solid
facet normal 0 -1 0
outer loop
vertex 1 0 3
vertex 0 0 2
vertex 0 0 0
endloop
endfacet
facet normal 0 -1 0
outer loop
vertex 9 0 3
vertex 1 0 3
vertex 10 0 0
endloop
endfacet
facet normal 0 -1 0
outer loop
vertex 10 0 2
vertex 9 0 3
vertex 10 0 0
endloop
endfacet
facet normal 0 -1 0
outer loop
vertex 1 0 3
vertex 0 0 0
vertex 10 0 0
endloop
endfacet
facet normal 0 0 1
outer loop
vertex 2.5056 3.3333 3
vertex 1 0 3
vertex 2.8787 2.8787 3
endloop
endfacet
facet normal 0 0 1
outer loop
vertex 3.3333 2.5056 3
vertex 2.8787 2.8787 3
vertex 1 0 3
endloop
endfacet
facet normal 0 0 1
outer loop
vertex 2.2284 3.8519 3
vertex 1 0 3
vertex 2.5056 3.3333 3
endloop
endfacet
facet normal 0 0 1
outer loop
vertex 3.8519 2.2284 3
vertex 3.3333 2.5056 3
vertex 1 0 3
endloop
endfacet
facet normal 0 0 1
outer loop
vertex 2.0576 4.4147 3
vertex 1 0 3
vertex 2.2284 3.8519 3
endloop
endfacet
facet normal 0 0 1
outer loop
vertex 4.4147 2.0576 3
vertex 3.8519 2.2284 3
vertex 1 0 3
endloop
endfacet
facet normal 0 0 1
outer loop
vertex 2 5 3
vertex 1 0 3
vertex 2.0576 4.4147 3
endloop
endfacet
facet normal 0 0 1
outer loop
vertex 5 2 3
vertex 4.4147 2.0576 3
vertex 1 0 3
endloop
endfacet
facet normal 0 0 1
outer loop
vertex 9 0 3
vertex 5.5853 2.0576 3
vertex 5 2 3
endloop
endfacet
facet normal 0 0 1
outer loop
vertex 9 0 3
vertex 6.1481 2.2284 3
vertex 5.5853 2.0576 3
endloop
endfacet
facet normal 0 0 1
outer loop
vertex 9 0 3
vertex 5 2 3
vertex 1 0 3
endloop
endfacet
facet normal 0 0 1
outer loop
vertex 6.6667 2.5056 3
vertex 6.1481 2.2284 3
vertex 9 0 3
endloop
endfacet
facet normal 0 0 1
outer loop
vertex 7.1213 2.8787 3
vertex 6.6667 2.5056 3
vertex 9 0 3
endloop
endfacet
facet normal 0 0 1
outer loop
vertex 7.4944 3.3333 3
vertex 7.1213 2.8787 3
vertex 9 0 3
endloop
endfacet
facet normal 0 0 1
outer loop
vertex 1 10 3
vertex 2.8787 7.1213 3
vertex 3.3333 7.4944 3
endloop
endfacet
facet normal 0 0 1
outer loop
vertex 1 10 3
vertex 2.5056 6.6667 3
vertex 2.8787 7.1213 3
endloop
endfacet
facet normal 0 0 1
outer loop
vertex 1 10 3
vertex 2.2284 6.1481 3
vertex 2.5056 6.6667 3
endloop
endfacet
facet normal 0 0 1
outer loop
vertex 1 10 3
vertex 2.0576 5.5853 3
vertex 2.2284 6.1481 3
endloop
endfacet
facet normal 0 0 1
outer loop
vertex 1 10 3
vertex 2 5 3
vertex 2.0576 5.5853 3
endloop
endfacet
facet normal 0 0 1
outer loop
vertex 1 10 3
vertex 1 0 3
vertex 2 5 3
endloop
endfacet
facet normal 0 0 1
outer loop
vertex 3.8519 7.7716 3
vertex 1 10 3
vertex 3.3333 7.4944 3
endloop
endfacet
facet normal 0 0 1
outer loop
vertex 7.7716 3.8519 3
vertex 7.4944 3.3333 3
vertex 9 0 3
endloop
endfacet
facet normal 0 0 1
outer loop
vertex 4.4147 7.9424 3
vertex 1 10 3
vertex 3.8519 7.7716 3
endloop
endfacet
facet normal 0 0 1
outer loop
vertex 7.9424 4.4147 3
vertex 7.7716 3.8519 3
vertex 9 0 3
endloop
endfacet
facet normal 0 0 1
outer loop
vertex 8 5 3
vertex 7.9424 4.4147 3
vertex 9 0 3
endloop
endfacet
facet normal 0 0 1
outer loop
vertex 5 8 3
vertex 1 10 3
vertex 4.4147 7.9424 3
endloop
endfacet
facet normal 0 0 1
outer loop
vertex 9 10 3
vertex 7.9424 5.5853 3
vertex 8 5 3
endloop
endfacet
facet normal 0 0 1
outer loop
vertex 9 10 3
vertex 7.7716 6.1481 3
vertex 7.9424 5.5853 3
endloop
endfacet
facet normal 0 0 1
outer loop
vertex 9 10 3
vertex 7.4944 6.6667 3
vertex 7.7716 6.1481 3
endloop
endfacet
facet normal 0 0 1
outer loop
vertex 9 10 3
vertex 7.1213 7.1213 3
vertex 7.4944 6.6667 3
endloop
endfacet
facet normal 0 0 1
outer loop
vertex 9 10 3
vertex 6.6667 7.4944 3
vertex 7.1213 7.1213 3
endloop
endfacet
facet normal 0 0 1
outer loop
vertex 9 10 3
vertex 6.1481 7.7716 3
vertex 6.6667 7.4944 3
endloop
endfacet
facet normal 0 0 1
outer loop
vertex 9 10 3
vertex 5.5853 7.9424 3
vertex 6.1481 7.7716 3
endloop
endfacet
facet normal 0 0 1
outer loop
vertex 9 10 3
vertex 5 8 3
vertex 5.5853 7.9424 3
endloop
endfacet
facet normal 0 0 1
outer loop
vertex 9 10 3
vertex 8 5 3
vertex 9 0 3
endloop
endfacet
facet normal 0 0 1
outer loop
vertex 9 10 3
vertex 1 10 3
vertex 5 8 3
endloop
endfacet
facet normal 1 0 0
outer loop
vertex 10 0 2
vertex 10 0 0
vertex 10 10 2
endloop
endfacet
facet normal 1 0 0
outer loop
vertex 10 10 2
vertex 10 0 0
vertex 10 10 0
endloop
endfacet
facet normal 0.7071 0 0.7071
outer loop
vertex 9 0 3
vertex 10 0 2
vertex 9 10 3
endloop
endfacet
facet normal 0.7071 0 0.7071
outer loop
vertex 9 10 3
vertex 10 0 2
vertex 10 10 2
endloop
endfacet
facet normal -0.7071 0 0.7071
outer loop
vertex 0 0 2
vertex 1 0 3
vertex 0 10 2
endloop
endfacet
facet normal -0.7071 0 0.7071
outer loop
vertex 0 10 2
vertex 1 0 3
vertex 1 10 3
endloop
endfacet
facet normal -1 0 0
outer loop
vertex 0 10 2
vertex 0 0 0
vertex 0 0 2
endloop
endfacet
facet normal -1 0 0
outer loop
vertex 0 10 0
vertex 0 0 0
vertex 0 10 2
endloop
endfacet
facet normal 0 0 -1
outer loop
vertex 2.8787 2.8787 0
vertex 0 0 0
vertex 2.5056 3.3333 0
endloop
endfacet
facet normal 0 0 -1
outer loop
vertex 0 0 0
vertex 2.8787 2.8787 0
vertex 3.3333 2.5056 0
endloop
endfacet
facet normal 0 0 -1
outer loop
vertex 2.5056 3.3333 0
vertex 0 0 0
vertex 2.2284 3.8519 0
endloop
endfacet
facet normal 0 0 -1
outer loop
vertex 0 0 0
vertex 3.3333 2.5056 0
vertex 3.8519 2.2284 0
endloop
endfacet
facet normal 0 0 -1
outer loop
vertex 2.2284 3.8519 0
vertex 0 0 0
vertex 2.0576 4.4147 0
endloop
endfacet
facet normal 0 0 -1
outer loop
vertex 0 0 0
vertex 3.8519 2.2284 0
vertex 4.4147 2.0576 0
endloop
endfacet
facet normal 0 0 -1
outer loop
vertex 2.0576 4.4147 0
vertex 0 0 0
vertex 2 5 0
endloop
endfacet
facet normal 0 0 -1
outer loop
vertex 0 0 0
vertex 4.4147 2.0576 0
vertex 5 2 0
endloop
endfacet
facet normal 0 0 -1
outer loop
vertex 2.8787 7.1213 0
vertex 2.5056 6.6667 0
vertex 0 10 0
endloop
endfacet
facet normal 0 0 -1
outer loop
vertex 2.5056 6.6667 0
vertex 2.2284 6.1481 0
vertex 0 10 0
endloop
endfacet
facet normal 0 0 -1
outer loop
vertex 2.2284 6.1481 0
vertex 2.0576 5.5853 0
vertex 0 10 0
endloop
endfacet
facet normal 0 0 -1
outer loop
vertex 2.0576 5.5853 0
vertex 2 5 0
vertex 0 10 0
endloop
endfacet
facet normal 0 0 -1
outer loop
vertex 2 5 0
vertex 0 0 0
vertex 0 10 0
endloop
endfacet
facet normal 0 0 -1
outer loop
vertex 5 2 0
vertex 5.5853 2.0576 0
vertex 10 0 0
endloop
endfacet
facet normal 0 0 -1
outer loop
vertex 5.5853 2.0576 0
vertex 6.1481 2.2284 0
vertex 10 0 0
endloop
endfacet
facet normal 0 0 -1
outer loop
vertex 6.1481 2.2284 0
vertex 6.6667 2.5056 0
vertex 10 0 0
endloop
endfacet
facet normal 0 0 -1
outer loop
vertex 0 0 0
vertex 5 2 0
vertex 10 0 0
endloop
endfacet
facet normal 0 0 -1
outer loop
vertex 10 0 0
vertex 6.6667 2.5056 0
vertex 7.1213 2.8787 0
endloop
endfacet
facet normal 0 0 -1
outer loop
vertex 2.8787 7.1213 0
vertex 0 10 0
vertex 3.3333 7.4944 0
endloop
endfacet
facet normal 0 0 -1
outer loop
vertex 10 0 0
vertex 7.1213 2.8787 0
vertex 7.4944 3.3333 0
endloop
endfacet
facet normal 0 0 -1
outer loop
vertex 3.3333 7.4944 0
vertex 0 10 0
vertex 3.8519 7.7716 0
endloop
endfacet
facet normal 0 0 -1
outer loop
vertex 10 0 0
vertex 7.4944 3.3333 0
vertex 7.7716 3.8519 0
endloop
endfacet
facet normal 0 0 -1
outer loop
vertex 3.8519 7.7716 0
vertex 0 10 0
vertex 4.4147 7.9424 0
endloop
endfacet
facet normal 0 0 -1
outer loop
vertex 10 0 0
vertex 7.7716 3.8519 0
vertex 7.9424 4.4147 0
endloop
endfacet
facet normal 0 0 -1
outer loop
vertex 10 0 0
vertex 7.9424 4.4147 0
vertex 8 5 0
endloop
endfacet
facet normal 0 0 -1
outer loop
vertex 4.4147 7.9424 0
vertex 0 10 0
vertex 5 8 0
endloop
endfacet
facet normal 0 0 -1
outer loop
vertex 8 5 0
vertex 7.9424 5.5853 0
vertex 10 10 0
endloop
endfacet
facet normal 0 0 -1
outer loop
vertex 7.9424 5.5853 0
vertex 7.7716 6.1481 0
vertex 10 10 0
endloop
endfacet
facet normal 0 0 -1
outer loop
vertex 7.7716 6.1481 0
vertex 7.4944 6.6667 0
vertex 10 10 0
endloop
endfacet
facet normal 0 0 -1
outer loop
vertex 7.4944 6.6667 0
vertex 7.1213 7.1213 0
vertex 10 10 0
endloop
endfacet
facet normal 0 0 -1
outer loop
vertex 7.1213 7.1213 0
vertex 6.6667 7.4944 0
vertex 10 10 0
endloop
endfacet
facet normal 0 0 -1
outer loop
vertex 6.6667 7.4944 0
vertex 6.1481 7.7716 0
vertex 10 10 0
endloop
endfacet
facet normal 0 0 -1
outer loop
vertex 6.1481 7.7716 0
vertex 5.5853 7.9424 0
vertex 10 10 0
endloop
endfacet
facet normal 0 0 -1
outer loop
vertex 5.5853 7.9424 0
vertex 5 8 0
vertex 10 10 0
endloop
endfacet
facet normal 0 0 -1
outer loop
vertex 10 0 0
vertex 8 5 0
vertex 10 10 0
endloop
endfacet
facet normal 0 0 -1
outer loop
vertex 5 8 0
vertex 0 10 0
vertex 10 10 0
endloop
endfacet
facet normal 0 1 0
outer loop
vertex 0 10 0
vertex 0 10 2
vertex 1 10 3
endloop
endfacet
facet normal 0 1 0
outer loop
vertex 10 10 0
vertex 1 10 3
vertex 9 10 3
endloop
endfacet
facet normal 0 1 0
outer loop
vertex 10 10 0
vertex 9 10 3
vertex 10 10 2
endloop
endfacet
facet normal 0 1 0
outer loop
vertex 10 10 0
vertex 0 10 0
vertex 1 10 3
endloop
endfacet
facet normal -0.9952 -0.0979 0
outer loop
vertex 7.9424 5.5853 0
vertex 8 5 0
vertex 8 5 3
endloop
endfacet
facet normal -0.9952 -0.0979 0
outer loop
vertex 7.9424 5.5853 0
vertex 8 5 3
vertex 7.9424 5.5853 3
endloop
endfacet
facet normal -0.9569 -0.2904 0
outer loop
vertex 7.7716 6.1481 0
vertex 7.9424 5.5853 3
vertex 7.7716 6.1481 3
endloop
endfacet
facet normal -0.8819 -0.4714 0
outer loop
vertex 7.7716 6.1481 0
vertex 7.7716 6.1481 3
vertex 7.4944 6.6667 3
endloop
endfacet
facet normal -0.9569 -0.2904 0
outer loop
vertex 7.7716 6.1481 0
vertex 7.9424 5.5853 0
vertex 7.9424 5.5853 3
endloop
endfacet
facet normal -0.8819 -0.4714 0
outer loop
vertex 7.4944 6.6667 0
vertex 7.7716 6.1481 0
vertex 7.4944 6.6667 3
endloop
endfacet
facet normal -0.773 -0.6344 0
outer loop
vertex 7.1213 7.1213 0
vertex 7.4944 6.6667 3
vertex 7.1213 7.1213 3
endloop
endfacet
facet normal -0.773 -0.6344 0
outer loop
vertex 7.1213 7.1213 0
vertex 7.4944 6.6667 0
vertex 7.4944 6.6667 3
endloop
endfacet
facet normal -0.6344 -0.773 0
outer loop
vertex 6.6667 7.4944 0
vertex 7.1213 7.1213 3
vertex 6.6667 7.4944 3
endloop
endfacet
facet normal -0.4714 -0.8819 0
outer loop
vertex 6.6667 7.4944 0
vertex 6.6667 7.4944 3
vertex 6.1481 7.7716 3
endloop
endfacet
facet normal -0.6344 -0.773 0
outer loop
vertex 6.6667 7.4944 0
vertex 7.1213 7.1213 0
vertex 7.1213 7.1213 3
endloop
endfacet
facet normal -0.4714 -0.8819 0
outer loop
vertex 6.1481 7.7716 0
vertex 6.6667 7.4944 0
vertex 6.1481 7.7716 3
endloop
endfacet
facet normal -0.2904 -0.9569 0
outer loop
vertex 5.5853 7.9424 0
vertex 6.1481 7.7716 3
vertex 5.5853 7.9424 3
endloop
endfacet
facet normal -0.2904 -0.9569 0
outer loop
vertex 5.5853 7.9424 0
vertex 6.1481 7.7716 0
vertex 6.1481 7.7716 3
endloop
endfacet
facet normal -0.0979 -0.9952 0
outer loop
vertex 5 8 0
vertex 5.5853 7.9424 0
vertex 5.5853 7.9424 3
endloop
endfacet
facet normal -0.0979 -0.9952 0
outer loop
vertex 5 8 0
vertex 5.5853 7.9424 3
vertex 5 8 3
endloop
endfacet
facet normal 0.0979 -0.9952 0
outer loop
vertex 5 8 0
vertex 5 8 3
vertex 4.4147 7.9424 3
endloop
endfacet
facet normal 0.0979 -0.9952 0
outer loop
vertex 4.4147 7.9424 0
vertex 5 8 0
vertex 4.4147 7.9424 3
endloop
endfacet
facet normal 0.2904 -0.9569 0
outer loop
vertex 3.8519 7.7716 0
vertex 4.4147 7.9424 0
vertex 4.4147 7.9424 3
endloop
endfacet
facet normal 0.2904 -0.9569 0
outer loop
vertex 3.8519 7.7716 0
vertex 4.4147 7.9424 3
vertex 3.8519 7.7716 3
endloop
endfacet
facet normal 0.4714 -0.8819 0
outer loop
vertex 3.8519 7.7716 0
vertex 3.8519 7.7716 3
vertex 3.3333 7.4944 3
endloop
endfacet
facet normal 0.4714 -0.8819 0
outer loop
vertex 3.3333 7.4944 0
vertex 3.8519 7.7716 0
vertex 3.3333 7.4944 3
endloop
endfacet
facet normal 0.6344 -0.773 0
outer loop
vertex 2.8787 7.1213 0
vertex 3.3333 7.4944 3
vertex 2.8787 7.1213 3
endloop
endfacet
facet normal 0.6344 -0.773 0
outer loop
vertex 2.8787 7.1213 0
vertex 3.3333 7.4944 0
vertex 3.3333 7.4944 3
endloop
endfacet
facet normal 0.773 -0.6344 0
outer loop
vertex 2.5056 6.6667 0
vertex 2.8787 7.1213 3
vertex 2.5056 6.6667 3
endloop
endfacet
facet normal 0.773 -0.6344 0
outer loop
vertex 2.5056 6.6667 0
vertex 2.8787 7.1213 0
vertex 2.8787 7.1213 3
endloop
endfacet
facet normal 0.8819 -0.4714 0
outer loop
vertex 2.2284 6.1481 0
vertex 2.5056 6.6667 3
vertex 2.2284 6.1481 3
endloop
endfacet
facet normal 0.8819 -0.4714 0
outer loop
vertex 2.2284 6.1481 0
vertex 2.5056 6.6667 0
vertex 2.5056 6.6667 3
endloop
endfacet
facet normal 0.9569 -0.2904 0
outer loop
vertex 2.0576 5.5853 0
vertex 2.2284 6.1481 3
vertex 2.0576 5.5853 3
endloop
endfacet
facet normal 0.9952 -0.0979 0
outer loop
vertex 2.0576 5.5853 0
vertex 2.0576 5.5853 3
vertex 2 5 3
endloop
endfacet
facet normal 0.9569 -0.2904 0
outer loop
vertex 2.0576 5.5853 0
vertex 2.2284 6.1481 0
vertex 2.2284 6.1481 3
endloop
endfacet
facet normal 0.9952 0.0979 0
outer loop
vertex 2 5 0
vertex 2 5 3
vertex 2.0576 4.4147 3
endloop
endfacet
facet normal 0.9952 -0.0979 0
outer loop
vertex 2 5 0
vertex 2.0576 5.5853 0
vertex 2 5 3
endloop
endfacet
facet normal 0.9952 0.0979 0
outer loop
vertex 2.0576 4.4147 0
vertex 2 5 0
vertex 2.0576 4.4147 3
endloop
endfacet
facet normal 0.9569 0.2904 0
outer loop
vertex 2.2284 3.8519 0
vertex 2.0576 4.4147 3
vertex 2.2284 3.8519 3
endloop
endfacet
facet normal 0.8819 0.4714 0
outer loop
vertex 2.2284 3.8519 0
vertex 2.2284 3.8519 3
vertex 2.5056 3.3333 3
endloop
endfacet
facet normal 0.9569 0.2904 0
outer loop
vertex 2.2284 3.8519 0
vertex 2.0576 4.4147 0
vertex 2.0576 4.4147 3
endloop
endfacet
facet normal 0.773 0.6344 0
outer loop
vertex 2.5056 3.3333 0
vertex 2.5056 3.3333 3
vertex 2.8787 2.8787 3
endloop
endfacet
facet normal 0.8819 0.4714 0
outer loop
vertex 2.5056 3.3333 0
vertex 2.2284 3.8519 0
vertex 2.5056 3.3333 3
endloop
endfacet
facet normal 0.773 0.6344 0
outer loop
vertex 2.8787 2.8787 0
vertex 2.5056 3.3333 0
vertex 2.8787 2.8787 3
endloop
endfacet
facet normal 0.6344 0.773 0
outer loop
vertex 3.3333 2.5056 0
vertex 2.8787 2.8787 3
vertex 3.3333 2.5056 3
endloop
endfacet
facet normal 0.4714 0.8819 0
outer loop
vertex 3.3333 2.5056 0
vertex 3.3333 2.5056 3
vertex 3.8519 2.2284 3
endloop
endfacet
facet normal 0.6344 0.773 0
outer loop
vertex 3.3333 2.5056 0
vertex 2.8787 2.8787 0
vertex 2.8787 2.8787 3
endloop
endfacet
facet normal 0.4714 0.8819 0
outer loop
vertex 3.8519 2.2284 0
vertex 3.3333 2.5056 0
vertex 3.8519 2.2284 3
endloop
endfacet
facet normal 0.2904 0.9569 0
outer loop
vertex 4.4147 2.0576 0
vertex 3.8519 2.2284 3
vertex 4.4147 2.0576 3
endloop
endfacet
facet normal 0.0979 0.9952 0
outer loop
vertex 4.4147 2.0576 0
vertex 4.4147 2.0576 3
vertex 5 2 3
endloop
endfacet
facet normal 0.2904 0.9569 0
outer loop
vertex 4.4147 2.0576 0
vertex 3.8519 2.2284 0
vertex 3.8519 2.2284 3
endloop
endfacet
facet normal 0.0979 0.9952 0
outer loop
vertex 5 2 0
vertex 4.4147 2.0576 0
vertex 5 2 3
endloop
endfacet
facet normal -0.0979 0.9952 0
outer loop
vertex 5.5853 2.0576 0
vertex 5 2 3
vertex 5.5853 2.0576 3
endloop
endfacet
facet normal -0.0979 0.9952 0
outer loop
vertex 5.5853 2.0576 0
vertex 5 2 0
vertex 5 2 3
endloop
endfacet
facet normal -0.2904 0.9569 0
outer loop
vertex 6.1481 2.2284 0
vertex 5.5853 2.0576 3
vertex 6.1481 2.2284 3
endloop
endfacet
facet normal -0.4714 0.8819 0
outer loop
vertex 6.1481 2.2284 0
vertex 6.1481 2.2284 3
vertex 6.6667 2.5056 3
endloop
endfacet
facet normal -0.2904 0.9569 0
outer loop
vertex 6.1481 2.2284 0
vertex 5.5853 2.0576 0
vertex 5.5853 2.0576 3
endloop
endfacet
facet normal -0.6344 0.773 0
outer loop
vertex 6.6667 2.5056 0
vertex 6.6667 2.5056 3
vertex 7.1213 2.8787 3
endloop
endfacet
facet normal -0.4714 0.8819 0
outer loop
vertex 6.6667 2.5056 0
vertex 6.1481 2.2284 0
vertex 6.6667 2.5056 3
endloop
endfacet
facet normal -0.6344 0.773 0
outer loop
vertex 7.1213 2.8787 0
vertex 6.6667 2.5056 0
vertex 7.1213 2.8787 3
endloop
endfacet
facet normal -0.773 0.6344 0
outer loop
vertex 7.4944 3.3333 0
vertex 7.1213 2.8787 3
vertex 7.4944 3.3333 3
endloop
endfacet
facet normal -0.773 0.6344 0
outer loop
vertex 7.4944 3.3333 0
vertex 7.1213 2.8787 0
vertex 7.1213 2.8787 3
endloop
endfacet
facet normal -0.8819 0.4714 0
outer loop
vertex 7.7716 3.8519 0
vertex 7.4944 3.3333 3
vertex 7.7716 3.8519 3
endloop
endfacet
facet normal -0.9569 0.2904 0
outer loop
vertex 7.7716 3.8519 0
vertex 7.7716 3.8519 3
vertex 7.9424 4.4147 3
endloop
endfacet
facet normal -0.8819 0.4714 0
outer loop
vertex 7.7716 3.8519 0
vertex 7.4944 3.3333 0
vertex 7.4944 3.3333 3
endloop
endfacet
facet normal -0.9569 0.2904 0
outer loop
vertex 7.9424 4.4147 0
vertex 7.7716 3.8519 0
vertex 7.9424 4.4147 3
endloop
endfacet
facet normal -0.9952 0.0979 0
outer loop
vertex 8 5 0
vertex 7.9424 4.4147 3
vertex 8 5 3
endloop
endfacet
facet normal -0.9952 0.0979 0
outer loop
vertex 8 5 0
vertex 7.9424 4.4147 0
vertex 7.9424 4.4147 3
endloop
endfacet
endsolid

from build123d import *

# Parameters (mm, degrees)
SKETCH_W        = 10
SKETCH_H        = 10
SKETCH_R        = 3
PAD_DEPTH       = 3
CHAMFER_SIZE    = 1
CHAMFER001_SIZE = 1


with BuildPart() as part:
    # Sketch → Pad (new body)
    with BuildSketch(Plane.XY):
        with Locations((5, 5)):
            Rectangle(SKETCH_W, SKETCH_H)
        with Locations((5, 5)):
            Circle(SKETCH_R, mode=Mode.SUBTRACT)
    extrude(amount=PAD_DEPTH)

    # Chamfer
    chamfer_edges = [part.edges().sort_by_distance(p)[0] for p in [
        (0, 5, 3),
    ]]
    chamfer(chamfer_edges, length=CHAMFER_SIZE)

    # Chamfer001
    chamfer001_edges = [part.edges().sort_by_distance(p)[0] for p in [
        (10, 5, 3),
    ]]
    chamfer(chamfer001_edges, length=CHAMFER001_SIZE)


solid = part.part
